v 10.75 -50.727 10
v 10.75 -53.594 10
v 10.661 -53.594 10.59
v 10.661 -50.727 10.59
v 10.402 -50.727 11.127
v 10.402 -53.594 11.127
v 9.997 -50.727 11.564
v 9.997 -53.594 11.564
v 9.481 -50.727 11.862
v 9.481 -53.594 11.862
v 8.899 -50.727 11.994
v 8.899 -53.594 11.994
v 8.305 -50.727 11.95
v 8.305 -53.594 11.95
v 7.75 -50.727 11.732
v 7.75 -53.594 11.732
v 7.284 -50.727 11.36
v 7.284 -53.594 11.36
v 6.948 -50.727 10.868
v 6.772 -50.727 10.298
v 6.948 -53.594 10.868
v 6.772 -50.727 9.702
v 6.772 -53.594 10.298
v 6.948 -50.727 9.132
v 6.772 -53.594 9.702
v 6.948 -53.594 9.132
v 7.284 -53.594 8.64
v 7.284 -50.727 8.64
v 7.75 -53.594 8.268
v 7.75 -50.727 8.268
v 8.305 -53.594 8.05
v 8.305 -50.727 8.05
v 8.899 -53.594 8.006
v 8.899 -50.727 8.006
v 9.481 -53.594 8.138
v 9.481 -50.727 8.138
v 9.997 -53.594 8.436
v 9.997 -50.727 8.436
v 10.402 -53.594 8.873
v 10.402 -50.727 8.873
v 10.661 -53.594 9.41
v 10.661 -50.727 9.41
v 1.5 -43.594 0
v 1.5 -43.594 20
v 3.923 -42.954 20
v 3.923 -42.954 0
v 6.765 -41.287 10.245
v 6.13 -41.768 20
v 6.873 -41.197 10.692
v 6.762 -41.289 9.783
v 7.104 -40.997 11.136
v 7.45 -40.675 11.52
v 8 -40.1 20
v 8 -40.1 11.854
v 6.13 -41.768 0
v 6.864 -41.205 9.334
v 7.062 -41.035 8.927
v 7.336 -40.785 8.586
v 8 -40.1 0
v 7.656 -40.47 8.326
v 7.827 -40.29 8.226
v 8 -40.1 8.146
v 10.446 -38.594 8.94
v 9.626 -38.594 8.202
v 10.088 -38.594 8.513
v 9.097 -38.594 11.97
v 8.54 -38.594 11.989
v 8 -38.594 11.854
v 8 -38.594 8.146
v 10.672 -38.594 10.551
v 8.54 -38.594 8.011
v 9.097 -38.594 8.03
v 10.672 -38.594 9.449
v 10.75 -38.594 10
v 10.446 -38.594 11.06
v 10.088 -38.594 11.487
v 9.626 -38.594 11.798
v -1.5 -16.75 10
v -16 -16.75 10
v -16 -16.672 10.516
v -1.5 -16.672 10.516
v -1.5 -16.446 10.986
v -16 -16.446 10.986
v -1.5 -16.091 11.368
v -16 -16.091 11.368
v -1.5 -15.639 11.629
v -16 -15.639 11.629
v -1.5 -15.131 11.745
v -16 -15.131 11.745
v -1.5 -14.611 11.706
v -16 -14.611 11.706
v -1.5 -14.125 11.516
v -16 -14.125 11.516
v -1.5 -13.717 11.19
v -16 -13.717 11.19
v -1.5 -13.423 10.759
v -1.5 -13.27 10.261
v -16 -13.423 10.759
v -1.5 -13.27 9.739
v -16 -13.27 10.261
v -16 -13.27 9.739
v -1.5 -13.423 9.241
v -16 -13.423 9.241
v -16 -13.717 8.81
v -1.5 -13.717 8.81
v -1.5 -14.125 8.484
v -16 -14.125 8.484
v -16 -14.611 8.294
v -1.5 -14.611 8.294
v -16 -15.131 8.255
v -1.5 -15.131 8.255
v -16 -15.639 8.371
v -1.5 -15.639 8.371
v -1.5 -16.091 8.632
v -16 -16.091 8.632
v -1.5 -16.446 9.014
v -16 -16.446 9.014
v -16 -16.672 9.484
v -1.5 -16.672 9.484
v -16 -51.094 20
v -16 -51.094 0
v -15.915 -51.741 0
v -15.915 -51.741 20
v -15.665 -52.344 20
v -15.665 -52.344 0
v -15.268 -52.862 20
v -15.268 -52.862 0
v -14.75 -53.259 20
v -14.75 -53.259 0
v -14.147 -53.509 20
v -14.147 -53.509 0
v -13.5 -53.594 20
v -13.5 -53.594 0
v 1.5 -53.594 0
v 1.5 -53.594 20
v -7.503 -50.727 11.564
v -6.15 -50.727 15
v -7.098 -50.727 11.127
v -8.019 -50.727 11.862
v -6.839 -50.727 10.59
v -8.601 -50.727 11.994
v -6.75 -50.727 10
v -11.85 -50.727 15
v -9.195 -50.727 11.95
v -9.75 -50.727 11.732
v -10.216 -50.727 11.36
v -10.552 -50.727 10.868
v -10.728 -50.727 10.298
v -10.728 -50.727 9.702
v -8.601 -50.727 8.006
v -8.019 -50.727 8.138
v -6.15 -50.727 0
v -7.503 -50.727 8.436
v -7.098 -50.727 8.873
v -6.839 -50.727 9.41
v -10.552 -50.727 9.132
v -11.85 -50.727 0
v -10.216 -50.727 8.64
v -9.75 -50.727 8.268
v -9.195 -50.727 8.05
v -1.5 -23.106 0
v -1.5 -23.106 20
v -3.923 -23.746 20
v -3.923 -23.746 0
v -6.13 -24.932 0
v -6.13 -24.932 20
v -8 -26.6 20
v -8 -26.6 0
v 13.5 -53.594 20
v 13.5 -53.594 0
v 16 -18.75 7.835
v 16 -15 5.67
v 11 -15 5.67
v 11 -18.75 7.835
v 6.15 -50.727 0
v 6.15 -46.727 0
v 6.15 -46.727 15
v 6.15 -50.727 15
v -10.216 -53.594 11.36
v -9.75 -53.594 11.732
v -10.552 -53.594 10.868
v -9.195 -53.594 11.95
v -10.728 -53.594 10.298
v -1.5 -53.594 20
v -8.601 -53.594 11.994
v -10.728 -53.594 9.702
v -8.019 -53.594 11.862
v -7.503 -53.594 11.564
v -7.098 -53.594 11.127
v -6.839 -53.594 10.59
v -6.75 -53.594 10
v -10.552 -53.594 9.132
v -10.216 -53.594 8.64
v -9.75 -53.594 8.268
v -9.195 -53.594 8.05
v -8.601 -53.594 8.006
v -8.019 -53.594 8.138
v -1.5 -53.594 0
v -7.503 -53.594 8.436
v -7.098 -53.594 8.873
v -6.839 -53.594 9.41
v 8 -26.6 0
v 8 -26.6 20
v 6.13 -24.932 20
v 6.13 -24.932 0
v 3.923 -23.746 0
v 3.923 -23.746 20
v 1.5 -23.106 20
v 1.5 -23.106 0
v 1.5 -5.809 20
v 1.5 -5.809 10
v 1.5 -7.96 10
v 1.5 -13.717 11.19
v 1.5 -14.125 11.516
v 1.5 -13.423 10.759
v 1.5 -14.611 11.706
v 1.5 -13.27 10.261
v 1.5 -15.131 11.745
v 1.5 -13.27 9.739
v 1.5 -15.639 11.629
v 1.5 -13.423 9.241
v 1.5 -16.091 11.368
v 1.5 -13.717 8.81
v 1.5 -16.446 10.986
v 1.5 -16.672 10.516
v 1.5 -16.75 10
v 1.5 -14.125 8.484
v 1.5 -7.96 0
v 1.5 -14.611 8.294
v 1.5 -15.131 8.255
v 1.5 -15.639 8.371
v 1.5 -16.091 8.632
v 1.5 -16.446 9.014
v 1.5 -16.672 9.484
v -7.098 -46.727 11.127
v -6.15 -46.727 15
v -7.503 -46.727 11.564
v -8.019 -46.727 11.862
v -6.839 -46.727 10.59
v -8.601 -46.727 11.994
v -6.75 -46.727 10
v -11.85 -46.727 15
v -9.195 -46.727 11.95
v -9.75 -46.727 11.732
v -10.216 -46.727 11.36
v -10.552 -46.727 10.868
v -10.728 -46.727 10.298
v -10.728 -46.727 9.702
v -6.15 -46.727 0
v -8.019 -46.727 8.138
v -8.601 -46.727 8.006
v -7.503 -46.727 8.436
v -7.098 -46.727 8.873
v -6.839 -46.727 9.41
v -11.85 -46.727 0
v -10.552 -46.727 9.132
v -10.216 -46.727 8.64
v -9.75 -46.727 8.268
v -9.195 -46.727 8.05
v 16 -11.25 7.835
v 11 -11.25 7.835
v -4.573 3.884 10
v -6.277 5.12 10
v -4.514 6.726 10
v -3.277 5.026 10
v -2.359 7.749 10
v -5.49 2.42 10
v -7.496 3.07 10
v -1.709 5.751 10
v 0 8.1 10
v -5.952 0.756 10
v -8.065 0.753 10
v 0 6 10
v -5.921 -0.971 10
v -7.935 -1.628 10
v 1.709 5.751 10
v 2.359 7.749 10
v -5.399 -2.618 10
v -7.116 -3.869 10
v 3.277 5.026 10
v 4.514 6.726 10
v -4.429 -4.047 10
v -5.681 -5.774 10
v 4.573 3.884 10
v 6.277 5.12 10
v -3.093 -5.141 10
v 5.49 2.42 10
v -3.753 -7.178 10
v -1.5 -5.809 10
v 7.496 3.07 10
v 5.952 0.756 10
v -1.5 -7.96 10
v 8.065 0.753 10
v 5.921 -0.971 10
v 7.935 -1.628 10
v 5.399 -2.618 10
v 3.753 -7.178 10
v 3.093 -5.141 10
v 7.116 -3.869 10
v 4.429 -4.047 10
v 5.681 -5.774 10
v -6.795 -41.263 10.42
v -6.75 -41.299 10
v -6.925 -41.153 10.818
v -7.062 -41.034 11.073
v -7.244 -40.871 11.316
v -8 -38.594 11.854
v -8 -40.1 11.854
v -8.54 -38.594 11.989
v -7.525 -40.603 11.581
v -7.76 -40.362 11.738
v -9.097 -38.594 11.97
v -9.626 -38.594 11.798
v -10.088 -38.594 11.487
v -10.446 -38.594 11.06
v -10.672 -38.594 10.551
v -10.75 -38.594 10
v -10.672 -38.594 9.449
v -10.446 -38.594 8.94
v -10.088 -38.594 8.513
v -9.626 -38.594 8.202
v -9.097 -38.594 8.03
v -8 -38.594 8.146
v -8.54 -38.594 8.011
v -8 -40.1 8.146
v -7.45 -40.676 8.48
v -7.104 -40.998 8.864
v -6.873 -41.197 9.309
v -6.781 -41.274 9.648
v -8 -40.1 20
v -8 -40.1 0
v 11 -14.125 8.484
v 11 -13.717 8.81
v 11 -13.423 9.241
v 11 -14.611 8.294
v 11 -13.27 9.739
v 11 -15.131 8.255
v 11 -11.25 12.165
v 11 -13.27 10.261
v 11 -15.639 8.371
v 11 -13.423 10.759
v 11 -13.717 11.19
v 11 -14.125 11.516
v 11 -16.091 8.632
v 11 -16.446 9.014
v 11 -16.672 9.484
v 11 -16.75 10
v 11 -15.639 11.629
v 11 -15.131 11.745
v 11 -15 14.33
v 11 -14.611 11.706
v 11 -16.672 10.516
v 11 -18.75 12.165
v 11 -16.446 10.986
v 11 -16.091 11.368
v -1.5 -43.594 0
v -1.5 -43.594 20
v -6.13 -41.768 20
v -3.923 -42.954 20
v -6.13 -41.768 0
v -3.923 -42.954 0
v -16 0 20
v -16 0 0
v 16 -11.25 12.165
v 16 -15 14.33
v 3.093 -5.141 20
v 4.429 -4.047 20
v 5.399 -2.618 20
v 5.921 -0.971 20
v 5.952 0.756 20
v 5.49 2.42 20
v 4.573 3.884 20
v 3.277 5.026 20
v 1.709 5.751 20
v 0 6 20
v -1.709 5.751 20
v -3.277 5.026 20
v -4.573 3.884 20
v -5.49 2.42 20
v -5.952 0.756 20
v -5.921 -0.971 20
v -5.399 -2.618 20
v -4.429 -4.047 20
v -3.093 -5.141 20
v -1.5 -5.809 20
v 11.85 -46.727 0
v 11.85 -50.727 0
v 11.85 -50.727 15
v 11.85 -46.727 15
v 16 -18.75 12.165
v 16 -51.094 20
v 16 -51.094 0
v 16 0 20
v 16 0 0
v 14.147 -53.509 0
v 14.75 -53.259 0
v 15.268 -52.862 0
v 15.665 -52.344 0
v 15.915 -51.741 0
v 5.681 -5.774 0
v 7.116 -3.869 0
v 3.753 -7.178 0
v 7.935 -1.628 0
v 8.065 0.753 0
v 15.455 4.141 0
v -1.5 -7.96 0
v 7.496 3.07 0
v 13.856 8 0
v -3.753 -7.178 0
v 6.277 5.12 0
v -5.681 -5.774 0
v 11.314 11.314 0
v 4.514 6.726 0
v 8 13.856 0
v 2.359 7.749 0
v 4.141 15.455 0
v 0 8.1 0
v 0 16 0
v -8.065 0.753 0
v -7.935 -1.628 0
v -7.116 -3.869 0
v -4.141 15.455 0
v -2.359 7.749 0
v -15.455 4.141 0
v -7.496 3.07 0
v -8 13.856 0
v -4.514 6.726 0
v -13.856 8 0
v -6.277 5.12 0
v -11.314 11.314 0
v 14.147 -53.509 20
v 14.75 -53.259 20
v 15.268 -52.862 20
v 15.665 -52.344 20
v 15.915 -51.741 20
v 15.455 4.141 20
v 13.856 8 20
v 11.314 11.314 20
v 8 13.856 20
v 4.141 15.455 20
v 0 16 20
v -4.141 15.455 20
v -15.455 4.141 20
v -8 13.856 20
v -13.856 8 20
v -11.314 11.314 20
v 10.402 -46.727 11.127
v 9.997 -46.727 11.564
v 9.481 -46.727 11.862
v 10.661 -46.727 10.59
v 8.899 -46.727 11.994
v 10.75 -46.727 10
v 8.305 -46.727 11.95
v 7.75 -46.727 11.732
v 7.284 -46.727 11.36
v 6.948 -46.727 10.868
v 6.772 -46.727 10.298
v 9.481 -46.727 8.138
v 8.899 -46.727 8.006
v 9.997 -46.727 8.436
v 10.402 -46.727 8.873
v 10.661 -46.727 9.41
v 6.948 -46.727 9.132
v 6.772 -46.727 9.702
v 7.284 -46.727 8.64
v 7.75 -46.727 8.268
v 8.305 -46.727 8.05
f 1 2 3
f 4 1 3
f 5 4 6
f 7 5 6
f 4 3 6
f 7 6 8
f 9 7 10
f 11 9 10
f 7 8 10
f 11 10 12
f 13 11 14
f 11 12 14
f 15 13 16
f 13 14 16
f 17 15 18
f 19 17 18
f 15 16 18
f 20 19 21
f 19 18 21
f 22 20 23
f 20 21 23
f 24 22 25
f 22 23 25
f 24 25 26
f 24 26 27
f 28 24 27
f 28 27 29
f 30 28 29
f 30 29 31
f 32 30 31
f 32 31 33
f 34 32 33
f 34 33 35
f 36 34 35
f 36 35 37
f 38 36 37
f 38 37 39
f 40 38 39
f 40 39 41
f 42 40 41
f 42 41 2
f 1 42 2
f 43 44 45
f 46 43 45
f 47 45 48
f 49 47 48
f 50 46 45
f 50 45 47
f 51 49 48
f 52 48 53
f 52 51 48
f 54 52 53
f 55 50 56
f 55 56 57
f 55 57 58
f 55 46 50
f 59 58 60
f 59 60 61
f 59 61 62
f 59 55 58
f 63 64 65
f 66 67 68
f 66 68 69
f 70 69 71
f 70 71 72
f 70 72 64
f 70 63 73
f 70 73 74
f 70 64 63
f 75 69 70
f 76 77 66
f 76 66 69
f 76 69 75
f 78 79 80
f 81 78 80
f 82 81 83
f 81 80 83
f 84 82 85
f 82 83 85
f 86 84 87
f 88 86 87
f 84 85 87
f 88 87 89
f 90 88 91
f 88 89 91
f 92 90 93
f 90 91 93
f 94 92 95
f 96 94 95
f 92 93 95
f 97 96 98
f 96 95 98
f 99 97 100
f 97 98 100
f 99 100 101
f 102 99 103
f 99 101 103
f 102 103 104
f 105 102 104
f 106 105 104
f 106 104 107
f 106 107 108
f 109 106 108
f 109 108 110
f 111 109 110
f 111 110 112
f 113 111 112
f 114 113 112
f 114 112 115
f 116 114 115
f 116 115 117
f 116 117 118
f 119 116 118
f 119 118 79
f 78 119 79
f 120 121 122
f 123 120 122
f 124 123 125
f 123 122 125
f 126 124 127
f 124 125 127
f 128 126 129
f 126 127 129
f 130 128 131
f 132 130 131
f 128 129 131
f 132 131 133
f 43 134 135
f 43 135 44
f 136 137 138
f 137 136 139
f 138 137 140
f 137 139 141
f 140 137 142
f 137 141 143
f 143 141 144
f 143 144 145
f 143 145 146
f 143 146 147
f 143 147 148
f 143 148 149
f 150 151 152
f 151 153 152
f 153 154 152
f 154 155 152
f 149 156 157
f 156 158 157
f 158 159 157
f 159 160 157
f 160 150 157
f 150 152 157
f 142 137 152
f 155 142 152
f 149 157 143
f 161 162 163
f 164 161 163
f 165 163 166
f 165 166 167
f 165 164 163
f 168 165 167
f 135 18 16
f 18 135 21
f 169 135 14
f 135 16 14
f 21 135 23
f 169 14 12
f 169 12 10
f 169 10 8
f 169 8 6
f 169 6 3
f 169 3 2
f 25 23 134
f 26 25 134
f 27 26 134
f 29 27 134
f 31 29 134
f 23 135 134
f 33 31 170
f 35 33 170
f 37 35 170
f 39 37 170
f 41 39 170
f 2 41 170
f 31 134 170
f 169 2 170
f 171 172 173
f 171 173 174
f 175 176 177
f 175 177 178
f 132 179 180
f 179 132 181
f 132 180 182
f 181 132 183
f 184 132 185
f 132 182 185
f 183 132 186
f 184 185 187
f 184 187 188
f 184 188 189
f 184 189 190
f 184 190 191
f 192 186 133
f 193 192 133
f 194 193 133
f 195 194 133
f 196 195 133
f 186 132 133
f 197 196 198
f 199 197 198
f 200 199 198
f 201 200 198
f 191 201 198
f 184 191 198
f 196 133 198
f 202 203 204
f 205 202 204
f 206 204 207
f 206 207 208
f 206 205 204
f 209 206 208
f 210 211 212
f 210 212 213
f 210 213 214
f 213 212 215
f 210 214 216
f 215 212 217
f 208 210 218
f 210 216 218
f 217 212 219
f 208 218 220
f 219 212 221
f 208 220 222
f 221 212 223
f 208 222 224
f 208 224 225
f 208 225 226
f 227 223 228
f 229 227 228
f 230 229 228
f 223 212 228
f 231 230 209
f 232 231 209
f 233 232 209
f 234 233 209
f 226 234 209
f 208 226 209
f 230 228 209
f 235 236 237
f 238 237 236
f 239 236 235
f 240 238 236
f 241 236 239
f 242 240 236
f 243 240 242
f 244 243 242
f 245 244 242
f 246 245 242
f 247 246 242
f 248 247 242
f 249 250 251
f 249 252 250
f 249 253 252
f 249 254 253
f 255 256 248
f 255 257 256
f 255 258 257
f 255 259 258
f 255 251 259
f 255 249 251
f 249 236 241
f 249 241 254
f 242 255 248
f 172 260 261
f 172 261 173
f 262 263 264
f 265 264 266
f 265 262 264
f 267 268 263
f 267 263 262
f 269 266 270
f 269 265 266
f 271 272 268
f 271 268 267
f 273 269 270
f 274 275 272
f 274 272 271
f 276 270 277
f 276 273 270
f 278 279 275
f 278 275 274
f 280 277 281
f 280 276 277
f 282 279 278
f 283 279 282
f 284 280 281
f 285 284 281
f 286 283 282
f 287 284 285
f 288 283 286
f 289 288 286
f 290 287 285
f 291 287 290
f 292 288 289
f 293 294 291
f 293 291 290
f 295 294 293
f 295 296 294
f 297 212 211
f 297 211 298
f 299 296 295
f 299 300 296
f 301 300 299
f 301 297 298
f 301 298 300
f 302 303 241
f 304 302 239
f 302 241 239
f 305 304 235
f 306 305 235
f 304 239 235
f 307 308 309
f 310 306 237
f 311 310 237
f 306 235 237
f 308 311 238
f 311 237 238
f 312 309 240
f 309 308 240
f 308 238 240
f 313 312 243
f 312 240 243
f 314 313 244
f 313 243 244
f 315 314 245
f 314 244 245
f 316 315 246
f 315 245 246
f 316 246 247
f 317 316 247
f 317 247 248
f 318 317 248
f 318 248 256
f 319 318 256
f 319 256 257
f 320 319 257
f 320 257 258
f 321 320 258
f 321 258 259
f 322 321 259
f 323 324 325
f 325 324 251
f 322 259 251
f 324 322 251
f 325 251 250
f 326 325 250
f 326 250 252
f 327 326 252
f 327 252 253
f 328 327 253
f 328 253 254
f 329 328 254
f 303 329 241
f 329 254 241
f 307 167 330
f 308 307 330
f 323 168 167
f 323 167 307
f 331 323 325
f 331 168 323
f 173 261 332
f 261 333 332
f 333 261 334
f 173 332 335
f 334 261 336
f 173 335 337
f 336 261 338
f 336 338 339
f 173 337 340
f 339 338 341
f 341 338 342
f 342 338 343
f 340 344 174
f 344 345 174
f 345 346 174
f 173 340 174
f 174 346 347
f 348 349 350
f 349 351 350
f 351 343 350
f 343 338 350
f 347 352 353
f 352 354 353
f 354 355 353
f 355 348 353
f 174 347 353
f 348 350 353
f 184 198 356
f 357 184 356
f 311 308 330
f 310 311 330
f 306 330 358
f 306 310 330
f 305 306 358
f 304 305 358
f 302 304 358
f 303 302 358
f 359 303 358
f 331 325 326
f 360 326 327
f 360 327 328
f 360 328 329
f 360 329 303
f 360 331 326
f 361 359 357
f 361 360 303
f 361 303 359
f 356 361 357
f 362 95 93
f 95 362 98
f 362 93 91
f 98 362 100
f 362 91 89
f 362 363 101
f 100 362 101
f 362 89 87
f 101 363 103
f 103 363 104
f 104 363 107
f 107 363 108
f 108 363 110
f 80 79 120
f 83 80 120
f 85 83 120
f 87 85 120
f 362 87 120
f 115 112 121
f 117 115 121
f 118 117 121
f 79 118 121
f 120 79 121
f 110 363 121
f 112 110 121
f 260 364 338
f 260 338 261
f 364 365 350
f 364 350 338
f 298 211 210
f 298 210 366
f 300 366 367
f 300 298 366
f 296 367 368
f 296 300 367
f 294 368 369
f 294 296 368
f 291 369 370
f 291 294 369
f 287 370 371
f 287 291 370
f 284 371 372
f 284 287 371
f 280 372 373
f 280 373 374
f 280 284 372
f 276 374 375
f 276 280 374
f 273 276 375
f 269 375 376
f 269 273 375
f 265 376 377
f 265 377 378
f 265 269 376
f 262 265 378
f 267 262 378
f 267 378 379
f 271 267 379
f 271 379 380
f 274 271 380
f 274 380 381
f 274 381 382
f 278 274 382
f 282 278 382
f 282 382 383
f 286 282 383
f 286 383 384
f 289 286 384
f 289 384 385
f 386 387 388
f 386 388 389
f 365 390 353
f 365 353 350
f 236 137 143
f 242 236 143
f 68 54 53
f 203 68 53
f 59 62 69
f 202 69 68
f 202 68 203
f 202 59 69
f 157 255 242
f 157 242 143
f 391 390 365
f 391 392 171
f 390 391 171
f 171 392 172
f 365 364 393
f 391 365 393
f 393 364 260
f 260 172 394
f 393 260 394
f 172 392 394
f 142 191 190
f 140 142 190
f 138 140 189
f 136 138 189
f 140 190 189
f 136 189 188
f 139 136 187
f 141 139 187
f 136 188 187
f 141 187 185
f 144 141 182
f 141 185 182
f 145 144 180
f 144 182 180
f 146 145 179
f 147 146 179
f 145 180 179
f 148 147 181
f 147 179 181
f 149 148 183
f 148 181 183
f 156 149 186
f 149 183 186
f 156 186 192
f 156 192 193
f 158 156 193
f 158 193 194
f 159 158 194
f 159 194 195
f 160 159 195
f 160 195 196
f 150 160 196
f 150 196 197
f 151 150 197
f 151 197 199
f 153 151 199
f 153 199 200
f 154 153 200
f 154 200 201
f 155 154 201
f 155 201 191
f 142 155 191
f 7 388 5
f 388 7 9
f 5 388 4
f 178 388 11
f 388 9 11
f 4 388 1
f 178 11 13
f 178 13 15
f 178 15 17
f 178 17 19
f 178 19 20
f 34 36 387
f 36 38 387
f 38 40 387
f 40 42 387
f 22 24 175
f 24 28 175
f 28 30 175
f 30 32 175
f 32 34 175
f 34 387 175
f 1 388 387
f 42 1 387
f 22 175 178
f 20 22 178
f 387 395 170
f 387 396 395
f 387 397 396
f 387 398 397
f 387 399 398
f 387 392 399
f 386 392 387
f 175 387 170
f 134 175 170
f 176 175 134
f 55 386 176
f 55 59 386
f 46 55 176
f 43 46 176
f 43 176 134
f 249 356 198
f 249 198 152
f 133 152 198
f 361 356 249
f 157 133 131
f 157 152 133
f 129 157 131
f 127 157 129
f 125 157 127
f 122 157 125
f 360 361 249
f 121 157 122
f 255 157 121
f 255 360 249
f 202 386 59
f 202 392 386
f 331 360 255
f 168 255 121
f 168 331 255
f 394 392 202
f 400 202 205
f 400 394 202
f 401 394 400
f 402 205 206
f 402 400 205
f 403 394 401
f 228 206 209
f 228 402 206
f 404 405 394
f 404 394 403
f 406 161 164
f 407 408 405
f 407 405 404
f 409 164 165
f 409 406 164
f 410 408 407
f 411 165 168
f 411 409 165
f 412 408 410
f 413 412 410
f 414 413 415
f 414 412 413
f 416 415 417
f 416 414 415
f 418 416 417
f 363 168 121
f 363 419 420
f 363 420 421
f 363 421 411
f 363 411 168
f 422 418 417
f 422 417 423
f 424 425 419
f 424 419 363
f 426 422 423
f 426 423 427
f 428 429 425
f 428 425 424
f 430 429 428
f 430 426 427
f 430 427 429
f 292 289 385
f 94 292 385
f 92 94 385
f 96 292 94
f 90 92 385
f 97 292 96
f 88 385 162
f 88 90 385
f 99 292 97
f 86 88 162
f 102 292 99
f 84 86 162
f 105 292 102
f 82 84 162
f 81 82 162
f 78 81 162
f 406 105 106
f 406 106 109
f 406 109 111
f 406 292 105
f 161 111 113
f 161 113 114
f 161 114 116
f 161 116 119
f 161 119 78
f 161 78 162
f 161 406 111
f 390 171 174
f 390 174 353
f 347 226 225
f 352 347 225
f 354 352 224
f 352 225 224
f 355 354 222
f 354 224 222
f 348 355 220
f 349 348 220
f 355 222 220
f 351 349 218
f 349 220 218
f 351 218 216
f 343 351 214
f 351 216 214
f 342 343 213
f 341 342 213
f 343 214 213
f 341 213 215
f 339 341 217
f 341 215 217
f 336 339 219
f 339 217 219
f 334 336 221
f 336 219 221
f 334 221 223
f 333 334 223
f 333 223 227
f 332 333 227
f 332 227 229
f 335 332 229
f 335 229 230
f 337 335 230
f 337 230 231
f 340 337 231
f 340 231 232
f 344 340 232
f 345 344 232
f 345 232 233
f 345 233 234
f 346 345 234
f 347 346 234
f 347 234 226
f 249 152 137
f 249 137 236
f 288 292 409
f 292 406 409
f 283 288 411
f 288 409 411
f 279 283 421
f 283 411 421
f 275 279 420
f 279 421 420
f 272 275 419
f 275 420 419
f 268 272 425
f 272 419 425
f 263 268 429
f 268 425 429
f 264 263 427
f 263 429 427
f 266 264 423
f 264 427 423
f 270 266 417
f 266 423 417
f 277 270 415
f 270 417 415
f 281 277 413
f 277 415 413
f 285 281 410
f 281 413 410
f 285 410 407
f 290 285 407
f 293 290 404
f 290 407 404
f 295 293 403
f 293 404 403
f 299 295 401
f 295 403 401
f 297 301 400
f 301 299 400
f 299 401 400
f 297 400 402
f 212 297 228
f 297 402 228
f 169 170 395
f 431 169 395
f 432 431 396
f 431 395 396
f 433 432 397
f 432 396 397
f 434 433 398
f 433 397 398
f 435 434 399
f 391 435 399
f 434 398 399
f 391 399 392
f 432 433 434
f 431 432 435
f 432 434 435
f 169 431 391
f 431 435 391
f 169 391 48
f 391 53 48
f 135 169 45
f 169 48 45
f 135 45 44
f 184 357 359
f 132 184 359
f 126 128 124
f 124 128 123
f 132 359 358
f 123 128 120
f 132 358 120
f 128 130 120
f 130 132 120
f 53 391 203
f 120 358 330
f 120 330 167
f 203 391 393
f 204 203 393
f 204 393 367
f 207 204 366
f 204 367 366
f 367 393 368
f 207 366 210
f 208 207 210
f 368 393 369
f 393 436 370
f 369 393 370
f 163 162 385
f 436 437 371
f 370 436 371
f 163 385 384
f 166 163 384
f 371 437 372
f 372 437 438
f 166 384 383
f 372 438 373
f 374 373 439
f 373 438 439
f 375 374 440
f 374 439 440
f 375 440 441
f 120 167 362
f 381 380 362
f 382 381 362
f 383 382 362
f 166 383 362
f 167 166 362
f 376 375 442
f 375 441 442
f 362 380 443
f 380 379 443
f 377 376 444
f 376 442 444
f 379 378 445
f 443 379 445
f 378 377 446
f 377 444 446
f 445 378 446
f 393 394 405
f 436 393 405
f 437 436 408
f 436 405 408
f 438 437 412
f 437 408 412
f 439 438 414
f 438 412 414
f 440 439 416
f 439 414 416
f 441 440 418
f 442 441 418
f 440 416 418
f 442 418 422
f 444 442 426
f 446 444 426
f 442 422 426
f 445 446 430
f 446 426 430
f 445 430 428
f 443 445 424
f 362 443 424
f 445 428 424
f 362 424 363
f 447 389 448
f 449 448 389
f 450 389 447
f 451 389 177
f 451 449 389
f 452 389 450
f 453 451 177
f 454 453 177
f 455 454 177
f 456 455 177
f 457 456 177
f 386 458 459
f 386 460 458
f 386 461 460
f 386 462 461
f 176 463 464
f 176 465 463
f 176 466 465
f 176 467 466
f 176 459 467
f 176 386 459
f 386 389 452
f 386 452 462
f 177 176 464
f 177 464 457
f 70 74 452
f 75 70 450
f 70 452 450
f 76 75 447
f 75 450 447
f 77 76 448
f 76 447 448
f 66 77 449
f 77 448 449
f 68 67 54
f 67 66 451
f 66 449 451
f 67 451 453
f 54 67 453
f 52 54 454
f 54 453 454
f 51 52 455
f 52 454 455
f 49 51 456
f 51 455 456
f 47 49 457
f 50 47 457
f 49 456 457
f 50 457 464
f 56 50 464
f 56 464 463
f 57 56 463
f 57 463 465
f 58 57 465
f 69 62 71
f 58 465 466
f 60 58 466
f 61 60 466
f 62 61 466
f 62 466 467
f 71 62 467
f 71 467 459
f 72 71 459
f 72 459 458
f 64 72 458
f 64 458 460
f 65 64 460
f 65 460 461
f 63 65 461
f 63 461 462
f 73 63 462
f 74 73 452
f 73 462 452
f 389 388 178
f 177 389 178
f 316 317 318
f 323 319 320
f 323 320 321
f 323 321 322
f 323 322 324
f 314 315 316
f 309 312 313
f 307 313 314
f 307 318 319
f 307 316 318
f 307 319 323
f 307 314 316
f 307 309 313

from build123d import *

# Parameters (mm, degrees)
PAD_DEPTH       = 20
SKETCH004_R     = 1.75
POCKET002_DEPTH = 50
POCKET003_DEPTH = 5
POCKET004_DEPTH = 15
SKETCH007_R     = 2
POCKET005_DEPTH = 15
SKETCH008_R     = 8.1
POCKET006_DEPTH = 10


with BuildPart() as part:
    # Sketch003 → Pad (new body)
    with BuildSketch(Plane.XY):
        with BuildLine():
            Line((-8, -26.6), (-8, -40.1))
            ThreePointArc((-8, -40.1), (-5.061117, -42.425857), (-1.5, -43.594227))
            Line((-1.5, -53.594227), (-1.5, -43.594227))
            Line((-13.5, -53.594227), (-1.5, -53.594227))
            ThreePointArc((-16, -51.094227), (-15.267767, -52.861994), (-13.5, -53.594227))
            Line((-16, 0), (-16, -51.094227))
            ThreePointArc((16, 0), (0, 16), (-16, 0))
            Line((16, -51.094227), (16, 0))
            ThreePointArc((13.5, -53.594227), (15.267767, -52.861994), (16, -51.094227))
            Line((1.5, -53.594227), (13.5, -53.594227))
            Line((1.5, -53.594227), (1.5, -43.594227))
            ThreePointArc((1.5, -43.594227), (5.061117, -42.425857), (8, -40.1))
            Line((8, -40.1), (8, -26.6))
            ThreePointArc((8, -26.6), (5.061117, -24.274143), (1.5, -23.105773))
            Line((1.5, -5.809475), (1.5, -23.105773))
            ThreePointArc((1.5, -5.809475), (0, 6), (-1.5, -5.809475))
            Line((-1.5, -5.809475), (-1.5, -23.105773))
            ThreePointArc((-1.5, -23.105773), (-5.061117, -24.274143), (-8, -26.6))
        make_face()
    extrude(amount=PAD_DEPTH)

    # Sketch004 (on Face9 of Pad) → Pocket002 (cut)
    with BuildSketch(Plane(origin=(-16, 0, 0), x_dir=(0, -1, 0), z_dir=(-1, 0, 0))):
        with Locations((15, 10)):
            Circle(SKETCH004_R)
    extrude(amount=-POCKET002_DEPTH, mode=Mode.SUBTRACT)

    # Sketch005 (on Face17 of Pocket002) → Pocket003 (cut)
    with BuildSketch(Plane(origin=(16, 0, 0), x_dir=(0, -1, 0), z_dir=(-1, 0, 0))):
        Polygon((18.75, 7.834936), (18.75, 12.165064), (15, 14.330127), (11.25, 12.165064), (11.25, 7.834936), (15, 5.669873), align=None)
    extrude(amount=POCKET003_DEPTH, mode=Mode.SUBTRACT)

    # Sketch006 → Pocket004 (cut)
    with BuildSketch(Plane(origin=(0, 0, 0), x_dir=(1, 0, 0), z_dir=(0, 0, -1))):
        Polygon((-7, 50.72662), (-6.15, 50.72662), (-6.15, 46.72662), (-11.85, 46.72662), (-11.85, 50.72662), (-11, 50.72662), align=None)
        Polygon((11, 50.72662), (11.85, 50.72662), (11.85, 46.72662), (6.15, 46.72662), (6.15, 50.72662), (7, 50.72662), align=None)
    extrude(amount=-POCKET004_DEPTH, mode=Mode.SUBTRACT)

    # Sketch007 (on Face16 of Pocket004) → Pocket005 (cut)
    with BuildSketch(Plane.XZ.offset(53.594227)):
        with Locations((-8.75, 10)):
            Circle(SKETCH007_R)
        with Locations((8.75, 10)):
            Circle(SKETCH007_R)
    extrude(amount=-POCKET005_DEPTH, mode=Mode.SUBTRACT)

    # Sketch008 (on Face4 of Pocket005) → Pocket006 (cut)
    with BuildSketch(Plane(origin=(0, 0, 0), x_dir=(1, 0, 0), z_dir=(0, 0, -1))):
        Circle(SKETCH008_R)
    extrude(amount=-POCKET006_DEPTH, mode=Mode.SUBTRACT)


solid = part.part
